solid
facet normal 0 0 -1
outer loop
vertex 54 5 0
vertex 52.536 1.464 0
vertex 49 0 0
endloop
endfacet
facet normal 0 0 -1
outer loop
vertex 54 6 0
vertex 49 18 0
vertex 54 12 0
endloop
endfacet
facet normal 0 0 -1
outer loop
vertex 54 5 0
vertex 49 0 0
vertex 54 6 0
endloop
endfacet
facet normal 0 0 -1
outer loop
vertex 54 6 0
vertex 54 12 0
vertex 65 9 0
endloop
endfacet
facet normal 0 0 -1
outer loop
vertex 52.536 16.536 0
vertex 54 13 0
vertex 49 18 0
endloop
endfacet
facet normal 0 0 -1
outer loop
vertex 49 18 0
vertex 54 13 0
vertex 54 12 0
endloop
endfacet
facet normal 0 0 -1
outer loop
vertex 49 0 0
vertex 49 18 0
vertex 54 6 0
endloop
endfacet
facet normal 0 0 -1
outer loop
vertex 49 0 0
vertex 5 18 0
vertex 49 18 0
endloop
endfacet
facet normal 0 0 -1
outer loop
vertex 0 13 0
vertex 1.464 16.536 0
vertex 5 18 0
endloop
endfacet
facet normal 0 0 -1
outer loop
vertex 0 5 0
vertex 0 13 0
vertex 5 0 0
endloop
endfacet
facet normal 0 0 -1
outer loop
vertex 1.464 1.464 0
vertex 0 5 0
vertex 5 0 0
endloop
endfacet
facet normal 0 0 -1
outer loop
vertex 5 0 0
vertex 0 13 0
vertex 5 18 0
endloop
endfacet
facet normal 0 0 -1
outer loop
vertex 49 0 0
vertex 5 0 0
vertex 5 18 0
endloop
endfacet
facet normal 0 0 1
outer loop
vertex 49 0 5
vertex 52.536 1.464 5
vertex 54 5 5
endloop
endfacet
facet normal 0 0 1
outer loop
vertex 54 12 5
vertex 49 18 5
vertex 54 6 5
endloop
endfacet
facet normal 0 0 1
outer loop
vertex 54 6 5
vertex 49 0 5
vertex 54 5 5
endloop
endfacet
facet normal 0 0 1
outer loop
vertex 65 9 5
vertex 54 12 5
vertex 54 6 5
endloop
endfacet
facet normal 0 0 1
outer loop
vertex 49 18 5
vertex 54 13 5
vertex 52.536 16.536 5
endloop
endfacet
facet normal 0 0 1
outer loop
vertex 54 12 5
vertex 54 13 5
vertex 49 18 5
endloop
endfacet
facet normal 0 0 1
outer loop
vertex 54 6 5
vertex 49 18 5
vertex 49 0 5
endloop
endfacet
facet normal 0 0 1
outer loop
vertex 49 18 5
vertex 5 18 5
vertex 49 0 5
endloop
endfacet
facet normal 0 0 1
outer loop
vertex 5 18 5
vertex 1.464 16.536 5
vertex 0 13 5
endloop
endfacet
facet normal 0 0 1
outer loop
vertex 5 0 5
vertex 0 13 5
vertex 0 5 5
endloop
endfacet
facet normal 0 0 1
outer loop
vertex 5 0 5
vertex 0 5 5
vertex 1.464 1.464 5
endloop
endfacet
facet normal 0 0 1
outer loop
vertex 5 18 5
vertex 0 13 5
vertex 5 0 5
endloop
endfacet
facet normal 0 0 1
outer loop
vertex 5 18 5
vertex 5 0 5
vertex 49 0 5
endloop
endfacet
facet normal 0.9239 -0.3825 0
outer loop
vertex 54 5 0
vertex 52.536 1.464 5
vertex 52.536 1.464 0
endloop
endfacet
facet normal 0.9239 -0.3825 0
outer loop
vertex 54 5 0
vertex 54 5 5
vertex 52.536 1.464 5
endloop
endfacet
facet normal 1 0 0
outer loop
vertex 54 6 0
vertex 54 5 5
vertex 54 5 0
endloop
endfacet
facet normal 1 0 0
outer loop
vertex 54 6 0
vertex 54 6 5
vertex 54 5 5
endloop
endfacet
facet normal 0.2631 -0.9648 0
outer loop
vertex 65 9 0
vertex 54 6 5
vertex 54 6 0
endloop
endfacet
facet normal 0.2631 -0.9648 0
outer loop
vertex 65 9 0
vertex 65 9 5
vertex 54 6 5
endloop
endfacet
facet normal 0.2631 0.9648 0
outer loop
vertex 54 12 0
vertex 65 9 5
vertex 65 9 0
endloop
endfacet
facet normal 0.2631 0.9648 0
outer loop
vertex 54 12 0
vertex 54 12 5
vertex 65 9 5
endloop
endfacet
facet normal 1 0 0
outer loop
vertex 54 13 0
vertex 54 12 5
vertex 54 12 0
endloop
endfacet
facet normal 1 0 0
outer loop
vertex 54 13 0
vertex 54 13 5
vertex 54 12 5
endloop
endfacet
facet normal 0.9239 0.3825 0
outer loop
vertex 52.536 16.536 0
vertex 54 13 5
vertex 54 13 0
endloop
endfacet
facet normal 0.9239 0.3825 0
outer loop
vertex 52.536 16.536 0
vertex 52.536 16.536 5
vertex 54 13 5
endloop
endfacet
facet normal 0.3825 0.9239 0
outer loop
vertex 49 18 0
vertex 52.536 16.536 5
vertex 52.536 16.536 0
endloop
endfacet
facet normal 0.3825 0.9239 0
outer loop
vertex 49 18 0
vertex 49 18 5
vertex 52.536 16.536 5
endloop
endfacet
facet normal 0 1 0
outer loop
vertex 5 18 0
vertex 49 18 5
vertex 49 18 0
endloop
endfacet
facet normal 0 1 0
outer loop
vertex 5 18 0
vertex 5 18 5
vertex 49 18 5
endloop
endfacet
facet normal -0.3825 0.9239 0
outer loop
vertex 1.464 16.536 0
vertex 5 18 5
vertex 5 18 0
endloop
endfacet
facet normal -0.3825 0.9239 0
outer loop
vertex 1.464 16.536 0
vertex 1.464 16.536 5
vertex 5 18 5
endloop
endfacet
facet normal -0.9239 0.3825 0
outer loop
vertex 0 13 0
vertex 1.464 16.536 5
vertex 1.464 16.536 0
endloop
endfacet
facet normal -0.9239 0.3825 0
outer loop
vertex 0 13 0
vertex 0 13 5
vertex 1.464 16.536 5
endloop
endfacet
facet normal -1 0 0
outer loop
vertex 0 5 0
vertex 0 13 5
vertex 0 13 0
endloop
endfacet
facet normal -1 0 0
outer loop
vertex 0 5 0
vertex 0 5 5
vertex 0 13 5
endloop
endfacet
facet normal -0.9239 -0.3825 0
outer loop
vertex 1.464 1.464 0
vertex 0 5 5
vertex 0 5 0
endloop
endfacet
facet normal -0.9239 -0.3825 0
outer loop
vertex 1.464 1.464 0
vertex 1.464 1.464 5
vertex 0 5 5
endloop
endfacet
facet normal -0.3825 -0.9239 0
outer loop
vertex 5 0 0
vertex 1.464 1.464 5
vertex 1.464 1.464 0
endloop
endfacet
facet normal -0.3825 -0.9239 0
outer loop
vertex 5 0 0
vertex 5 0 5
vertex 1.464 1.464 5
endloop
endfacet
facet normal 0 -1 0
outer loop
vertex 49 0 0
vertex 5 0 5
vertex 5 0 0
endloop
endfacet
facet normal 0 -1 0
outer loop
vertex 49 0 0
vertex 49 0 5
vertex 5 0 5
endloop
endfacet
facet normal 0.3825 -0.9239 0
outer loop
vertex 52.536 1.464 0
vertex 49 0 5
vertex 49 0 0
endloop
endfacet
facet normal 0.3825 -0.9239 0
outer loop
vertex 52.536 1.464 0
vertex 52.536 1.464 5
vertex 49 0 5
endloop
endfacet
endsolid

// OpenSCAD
$fn = 32;

// ----------------------------------------------------------------------
// Ratchet pawl: 54 x 18 mm body, beak 11 mm с правого торца
// ----------------------------------------------------------------------

// --- parameters (mm) ---
profile_height = 5;       // extrusion height
profile_points = 15;      // points of the closed outline

profile = [[0, 5], [1.464, 1.464], [5, 0], [49, 0], [52.536, 1.464], [54, 5], [54, 6], [65, 9], [54, 12], [54, 13], [52.536, 16.536], [49, 18], [5, 18], [1.464, 16.536], [0, 13]];  // single closed polygon, 15 points, counter clockwise

// --- the one profile operation ---
linear_extrude(height = profile_height) polygon(points = profile);
